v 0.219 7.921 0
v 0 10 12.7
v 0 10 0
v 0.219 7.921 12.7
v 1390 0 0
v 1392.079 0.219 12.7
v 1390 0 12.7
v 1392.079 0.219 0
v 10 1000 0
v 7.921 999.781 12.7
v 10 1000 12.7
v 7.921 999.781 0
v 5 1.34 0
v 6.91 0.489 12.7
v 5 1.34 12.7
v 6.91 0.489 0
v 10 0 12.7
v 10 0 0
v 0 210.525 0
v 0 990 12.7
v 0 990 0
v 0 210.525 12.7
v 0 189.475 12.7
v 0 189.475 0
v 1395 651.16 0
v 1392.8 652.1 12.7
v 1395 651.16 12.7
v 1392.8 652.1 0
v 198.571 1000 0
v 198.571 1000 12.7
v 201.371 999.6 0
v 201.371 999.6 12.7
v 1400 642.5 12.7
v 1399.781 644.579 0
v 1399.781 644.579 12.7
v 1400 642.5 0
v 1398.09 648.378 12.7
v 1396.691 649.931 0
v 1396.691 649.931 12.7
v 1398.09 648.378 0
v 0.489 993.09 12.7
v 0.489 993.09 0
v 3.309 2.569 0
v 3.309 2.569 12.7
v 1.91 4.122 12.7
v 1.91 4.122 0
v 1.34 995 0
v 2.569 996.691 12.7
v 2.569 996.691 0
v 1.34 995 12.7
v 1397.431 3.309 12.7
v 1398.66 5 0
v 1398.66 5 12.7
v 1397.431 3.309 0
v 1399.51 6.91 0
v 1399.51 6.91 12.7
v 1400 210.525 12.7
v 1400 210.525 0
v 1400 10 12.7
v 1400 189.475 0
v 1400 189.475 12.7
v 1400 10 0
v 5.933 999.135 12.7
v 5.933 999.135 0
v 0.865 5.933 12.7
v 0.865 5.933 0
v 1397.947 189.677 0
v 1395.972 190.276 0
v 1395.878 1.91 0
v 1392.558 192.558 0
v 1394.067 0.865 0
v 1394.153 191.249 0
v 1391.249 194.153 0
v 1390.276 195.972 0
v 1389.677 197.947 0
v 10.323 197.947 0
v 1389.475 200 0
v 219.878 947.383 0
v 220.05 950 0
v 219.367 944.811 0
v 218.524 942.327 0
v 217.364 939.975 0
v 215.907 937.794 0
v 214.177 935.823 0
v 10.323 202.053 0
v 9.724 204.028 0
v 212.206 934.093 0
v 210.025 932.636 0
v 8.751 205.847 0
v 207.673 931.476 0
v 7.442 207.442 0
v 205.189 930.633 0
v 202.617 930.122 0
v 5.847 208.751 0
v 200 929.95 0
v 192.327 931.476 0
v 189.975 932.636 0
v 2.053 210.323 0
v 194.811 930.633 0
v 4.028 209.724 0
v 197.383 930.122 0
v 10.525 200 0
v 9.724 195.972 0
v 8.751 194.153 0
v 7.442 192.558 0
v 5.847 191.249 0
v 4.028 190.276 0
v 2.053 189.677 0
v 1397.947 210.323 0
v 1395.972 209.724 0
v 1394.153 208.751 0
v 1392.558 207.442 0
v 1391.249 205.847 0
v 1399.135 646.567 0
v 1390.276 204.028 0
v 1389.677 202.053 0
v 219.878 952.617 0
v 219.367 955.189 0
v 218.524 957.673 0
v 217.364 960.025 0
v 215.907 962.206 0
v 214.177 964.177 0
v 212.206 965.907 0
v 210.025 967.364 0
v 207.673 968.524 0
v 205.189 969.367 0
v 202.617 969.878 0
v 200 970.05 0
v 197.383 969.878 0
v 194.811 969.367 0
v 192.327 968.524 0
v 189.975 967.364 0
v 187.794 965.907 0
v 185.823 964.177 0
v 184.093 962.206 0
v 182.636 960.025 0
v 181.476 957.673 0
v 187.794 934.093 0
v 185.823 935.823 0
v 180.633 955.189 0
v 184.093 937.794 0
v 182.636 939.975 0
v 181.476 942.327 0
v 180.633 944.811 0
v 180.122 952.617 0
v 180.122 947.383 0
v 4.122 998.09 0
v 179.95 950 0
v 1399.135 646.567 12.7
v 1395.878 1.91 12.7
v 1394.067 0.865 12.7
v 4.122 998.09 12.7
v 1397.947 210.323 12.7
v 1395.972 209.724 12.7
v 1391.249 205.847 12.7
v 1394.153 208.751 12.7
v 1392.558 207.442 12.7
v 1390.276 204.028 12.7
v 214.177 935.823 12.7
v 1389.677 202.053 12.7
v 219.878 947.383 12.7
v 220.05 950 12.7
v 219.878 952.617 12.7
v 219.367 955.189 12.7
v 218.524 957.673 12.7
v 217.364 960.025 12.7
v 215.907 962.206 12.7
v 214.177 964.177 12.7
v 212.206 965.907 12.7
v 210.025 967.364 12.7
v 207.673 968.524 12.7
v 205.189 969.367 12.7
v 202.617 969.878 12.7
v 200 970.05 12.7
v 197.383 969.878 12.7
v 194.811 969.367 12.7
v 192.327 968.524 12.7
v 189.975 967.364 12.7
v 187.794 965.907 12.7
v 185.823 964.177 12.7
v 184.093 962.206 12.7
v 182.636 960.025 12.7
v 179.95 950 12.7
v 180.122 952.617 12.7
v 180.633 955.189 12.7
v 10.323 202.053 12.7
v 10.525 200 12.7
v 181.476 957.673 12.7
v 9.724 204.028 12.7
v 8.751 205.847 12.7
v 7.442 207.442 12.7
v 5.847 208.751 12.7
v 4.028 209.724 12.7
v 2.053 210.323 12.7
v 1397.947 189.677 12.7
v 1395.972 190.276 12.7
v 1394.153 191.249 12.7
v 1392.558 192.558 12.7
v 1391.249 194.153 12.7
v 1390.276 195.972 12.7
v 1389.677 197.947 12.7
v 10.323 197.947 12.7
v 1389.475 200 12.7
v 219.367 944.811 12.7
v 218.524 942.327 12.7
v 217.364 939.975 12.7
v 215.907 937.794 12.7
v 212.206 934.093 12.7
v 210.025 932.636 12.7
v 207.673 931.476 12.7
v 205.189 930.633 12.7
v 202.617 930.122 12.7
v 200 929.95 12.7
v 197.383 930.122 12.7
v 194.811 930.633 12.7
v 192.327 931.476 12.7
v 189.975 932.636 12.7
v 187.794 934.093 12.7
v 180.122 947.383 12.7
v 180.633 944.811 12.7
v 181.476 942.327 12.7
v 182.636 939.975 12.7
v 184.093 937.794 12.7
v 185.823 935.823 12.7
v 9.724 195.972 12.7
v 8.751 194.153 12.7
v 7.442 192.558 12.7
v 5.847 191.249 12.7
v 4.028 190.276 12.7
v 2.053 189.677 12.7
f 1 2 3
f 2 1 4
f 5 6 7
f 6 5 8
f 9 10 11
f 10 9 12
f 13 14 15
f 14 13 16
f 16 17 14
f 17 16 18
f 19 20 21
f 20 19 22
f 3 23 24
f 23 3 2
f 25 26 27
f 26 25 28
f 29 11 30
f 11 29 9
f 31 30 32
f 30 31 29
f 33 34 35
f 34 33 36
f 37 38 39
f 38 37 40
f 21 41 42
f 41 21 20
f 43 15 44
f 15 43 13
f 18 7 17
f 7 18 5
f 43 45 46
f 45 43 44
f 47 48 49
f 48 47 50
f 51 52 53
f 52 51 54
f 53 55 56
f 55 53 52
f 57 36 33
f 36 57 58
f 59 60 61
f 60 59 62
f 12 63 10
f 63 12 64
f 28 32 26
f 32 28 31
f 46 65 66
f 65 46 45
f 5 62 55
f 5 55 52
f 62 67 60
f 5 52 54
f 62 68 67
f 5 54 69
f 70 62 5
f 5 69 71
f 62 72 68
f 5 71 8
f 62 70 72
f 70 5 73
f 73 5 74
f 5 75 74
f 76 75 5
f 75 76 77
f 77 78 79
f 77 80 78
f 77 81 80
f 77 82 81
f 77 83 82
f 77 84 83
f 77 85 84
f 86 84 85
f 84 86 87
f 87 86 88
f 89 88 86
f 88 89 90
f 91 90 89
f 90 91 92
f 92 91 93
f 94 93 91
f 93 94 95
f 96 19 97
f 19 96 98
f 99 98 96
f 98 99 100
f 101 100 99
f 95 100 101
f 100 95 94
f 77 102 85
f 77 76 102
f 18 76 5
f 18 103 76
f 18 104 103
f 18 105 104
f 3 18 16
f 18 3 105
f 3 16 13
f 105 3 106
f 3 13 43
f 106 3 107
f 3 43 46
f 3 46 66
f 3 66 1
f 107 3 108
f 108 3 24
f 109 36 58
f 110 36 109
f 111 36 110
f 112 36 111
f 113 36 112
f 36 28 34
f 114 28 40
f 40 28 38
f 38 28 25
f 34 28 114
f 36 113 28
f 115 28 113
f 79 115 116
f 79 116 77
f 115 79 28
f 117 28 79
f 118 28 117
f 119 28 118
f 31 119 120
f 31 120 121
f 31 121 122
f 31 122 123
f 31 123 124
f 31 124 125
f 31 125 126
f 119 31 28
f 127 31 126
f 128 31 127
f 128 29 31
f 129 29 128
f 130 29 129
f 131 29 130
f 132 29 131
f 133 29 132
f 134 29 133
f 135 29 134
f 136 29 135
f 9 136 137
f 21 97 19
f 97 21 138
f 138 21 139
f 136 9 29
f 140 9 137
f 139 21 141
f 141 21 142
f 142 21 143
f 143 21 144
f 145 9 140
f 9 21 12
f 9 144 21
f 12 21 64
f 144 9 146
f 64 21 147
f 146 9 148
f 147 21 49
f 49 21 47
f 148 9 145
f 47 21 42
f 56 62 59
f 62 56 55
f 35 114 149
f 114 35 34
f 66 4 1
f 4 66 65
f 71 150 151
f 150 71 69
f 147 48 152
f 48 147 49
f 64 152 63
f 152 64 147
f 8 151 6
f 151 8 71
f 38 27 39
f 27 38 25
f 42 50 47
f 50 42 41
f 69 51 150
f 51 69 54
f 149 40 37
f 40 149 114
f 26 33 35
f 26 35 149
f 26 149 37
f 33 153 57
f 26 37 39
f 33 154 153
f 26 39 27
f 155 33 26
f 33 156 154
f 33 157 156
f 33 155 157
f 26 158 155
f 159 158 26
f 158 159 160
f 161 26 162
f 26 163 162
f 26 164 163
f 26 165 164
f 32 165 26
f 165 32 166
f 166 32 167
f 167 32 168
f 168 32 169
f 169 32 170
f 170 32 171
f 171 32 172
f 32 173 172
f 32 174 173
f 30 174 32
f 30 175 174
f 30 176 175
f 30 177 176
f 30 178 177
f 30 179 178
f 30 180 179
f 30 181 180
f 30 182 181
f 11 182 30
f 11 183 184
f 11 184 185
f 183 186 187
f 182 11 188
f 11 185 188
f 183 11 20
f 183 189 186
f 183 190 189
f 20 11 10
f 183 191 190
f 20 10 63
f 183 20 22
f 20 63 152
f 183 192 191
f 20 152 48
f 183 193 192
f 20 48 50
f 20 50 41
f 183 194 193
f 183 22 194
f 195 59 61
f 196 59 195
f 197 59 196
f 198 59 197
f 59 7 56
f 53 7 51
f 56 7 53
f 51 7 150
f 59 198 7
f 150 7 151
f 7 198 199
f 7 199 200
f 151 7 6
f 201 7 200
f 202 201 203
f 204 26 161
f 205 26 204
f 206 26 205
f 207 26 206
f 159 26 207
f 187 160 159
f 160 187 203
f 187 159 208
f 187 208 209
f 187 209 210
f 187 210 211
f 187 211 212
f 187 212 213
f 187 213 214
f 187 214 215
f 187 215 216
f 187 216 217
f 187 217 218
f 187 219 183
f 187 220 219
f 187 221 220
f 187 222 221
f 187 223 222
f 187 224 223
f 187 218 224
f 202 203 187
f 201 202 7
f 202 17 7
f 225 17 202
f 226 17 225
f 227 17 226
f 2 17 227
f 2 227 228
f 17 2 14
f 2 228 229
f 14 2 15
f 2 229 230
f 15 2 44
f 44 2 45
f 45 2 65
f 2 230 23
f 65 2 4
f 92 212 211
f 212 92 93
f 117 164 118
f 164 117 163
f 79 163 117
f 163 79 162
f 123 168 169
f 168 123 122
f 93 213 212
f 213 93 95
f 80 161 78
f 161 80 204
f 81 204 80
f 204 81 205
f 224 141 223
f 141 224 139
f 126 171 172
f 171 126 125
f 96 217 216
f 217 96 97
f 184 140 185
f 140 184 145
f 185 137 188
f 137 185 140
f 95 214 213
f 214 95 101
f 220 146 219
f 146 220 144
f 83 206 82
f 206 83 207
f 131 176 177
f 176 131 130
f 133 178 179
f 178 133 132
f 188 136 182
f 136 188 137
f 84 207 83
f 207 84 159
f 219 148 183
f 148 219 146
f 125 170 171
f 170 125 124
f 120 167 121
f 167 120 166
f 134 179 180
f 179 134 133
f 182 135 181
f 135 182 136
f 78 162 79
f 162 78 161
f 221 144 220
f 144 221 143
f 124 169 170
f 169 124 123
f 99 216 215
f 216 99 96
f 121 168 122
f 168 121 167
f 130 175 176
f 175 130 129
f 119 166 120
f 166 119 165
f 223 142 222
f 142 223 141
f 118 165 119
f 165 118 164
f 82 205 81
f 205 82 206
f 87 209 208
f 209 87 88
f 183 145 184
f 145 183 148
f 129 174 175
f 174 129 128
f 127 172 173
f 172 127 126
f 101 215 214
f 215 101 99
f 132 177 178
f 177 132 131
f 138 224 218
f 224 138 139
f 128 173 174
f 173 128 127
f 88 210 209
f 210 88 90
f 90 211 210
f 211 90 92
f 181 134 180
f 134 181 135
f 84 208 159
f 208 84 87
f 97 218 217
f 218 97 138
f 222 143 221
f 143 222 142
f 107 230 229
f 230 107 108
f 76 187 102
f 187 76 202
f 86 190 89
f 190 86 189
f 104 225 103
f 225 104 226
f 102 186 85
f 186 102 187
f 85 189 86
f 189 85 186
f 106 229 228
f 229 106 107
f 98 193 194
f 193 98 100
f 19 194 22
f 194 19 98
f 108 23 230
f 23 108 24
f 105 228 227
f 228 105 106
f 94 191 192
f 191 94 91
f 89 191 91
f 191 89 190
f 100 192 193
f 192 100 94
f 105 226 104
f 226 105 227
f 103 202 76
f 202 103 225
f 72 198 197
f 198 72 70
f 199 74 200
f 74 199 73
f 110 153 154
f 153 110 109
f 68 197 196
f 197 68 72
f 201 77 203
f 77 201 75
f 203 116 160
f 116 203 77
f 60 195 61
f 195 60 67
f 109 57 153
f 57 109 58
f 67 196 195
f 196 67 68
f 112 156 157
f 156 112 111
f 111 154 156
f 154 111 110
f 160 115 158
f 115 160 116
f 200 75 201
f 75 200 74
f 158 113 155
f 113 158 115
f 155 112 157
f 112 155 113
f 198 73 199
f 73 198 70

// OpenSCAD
// side_panel.scad
// Triangular side panel for LifeTrac v25
// This is the main structural plate that forms the sides of the machine
// Part of the "sandwich" design with 4 panels total (2 inner, 2 outer)

// Include necessary parameters from main assembly
include <../openscad/lifetrac_v25_params.scad>

// Triangular profile for side panels
// Tall end at rear (Y=0), shorter sloped end at front (Y=WHEEL_BASE)
module side_panel_profile() {
    offset(r=10) offset(r=-10)  // Rounded corners
    polygon([
        [0, 0],                              // Rear bottom
        [WHEEL_BASE, 0],                     // Front bottom
        [WHEEL_BASE, MACHINE_HEIGHT * 0.65], // Front top (sloped down)
        [200, MACHINE_HEIGHT],               // Near-rear top (arm pivot area)
        [0, MACHINE_HEIGHT]                  // Rear top (full height)
    ]);
}

// Arc slot cutout for cross beam clearance
// Creates an arc-shaped slot that allows the cross beam to rotate through
module cross_beam_arc_slot(beam_distance, slot_width) {
    // Pivot point in panel local coordinates
    pivot_x = PIVOT_PANEL_X;
    pivot_y = PIVOT_PANEL_Y;
    
    // Arc radius = distance from pivot to cross beam center
    arc_radius = beam_distance;
    
    // Half-width of the slot (beam size + clearance)
    half_slot = slot_width / 2;
    
    // Generate arc by rotating around pivot
    // The arc sweeps from ARM_MIN_ANGLE to ARM_MAX_ANGLE
    // We extend slightly beyond to ensure full clearance
    arc_start = ARM_MIN_ANGLE - 5;
    arc_end = ARM_MAX_ANGLE + 5;
    arc_steps = 60;
    
    translate([pivot_x, pivot_y])
    for (i = [0:arc_steps-1]) {
        angle1 = arc_start + i * (arc_end - arc_start) / arc_steps;
        angle2 = arc_start + (i + 1) * (arc_end - arc_start) / arc_steps;
        
        // Inner and outer points for this arc segment
        hull() {
            // Point at angle1, inner radius
            translate([(arc_radius - half_slot) * cos(angle1), (arc_radius - half_slot) * sin(angle1)])
            circle(d=5, $fn=8);
            
            // Point at angle1, outer radius
            translate([(arc_radius + half_slot) * cos(angle1), (arc_radius + half_slot) * sin(angle1)])
            circle(d=5, $fn=8);
            
            // Point at angle2, inner radius
            translate([(arc_radius - half_slot) * cos(angle2), (arc_radius - half_slot) * sin(angle2)])
            circle(d=5, $fn=8);
            
            // Point at angle2, outer radius
            translate([(arc_radius + half_slot) * cos(angle2), (arc_radius + half_slot) * sin(angle2)])
            circle(d=5, $fn=8);
        }
    }
}

// Main side panel module with all features (holes, slots)
// is_inner: true for inner panels (with arc slots), false for outer panels
module side_panel(is_inner = false) {
    slot_width = CROSS_BEAM_SIZE + 2 * CROSS_BEAM_CLEARANCE;  // Total slot width with clearance
    
    difference() {
        linear_extrude(height=PANEL_THICKNESS)
        difference() {
            side_panel_profile();
            
            // Cross beam arc slots (only on inner panels)
            if (is_inner) {
                // First cross beam slot (near pivot)
                cross_beam_arc_slot(CROSS_BEAM_1_POS, slot_width);
                
                // Second cross beam slot (near bucket) - only if it intersects the panel
                // The second beam is far forward and may not need a cutout
                // Check if any part of the arc passes through the panel
                if (CROSS_BEAM_2_POS < WHEEL_BASE + 200) {
                    cross_beam_arc_slot(CROSS_BEAM_2_POS, slot_width);
                }
            }
        }
        
        // Arm pivot hole near rear top (where the tall section is)
        // Position matches ARM_PIVOT_Y in world coordinates
        translate([ARM_PIVOT_Y, MACHINE_HEIGHT - 50, PANEL_THICKNESS/2])
        cylinder(d=PIVOT_PIN_DIA + 2, h=PANEL_THICKNESS+4, center=true, $fn=48);
        
        // Lift cylinder base mount hole (only on inner panels)
        if (is_inner) {
            translate([WHEEL_BASE - LIFT_CYL_BASE_Y, LIFT_CYL_BASE_Z, PANEL_THICKNESS/2])
            cylinder(d=BOLT_DIA_1 + 2, h=PANEL_THICKNESS+4, center=true, $fn=32);
        }
        
        // Wheel axle holes
        translate([0, WHEEL_DIAMETER/2 - 50, PANEL_THICKNESS/2])
        cylinder(d=BOLT_DIA_3_4 + 2, h=PANEL_THICKNESS+4, center=true, $fn=32);
        
        translate([WHEEL_BASE, WHEEL_DIAMETER/2 - 50, PANEL_THICKNESS/2])
        cylinder(d=BOLT_DIA_3_4 + 2, h=PANEL_THICKNESS+4, center=true, $fn=32);
    }
}

// Render the part for preview/export
if ($preview || len(search("side_panel.scad", parent_modules())) == 0) {
    side_panel(is_inner = false);  // Default to outer panel
}
